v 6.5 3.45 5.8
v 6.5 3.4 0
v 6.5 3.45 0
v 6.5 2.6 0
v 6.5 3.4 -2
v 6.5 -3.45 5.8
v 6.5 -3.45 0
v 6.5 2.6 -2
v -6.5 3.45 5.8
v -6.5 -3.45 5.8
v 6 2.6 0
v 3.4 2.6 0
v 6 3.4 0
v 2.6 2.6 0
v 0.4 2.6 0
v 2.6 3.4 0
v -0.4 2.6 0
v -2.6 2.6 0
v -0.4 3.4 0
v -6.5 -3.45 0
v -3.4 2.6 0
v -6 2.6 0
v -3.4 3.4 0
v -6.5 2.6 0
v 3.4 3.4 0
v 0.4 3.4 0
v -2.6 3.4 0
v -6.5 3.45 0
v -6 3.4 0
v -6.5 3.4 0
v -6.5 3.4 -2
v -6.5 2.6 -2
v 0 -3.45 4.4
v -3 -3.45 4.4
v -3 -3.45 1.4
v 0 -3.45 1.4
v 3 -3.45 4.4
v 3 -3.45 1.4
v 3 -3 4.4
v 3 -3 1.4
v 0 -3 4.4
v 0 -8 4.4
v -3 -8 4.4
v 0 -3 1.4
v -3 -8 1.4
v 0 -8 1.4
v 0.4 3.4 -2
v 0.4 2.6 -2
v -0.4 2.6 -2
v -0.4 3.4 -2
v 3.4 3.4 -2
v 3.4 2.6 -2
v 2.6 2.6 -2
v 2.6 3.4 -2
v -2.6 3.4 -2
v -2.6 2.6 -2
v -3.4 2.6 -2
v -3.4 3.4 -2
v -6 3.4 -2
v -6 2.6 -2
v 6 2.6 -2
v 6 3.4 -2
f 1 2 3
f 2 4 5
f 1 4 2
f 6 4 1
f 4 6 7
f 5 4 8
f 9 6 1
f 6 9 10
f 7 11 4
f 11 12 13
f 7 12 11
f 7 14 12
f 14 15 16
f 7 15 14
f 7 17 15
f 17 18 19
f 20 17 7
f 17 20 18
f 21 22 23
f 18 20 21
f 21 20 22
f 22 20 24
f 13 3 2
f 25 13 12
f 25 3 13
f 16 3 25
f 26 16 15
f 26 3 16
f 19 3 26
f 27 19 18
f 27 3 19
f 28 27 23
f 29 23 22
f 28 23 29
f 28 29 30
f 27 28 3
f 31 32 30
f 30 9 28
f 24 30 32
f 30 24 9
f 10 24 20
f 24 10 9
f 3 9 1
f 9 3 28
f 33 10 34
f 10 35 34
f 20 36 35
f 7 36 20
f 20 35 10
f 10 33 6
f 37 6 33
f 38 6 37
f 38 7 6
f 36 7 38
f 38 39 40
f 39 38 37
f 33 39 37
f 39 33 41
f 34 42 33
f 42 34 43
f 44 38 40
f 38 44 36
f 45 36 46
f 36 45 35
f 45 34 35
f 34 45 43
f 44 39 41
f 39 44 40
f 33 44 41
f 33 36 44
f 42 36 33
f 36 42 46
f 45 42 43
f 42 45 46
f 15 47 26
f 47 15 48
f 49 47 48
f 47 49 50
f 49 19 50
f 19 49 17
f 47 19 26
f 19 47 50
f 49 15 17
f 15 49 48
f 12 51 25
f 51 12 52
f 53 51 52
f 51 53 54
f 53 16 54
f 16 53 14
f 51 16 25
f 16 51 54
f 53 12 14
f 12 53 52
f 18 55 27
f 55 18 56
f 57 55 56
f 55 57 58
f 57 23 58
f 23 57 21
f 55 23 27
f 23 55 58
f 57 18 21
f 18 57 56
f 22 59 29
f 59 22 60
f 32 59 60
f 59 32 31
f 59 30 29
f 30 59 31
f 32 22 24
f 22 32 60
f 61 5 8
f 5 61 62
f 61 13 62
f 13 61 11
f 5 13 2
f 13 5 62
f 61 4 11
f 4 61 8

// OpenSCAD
difference(){
    color("gray")translate([-13/2,-6.9/2,0])cube([13,6.9,5.8]);
    color("black")translate([-6/2,-5,1.4])cube([6,2,3]);
}
color("black")translate([-6/2,-8,1.4])cube([3,6,3]);

color("gray")translate([0,3,-1])cube([0.8,0.8,2],true);
color("gray")translate([3,3,-1])cube([0.8,0.8,2],true);
color("gray")translate([-3,3,-1])cube([0.8,0.8,2],true);
color("gray")translate([-13/2+0.25,3,-1])cube([0.5,0.8,2],true);
color("gray")translate([13/2-0.25,3,-1])cube([0.5,0.8,2],true);
